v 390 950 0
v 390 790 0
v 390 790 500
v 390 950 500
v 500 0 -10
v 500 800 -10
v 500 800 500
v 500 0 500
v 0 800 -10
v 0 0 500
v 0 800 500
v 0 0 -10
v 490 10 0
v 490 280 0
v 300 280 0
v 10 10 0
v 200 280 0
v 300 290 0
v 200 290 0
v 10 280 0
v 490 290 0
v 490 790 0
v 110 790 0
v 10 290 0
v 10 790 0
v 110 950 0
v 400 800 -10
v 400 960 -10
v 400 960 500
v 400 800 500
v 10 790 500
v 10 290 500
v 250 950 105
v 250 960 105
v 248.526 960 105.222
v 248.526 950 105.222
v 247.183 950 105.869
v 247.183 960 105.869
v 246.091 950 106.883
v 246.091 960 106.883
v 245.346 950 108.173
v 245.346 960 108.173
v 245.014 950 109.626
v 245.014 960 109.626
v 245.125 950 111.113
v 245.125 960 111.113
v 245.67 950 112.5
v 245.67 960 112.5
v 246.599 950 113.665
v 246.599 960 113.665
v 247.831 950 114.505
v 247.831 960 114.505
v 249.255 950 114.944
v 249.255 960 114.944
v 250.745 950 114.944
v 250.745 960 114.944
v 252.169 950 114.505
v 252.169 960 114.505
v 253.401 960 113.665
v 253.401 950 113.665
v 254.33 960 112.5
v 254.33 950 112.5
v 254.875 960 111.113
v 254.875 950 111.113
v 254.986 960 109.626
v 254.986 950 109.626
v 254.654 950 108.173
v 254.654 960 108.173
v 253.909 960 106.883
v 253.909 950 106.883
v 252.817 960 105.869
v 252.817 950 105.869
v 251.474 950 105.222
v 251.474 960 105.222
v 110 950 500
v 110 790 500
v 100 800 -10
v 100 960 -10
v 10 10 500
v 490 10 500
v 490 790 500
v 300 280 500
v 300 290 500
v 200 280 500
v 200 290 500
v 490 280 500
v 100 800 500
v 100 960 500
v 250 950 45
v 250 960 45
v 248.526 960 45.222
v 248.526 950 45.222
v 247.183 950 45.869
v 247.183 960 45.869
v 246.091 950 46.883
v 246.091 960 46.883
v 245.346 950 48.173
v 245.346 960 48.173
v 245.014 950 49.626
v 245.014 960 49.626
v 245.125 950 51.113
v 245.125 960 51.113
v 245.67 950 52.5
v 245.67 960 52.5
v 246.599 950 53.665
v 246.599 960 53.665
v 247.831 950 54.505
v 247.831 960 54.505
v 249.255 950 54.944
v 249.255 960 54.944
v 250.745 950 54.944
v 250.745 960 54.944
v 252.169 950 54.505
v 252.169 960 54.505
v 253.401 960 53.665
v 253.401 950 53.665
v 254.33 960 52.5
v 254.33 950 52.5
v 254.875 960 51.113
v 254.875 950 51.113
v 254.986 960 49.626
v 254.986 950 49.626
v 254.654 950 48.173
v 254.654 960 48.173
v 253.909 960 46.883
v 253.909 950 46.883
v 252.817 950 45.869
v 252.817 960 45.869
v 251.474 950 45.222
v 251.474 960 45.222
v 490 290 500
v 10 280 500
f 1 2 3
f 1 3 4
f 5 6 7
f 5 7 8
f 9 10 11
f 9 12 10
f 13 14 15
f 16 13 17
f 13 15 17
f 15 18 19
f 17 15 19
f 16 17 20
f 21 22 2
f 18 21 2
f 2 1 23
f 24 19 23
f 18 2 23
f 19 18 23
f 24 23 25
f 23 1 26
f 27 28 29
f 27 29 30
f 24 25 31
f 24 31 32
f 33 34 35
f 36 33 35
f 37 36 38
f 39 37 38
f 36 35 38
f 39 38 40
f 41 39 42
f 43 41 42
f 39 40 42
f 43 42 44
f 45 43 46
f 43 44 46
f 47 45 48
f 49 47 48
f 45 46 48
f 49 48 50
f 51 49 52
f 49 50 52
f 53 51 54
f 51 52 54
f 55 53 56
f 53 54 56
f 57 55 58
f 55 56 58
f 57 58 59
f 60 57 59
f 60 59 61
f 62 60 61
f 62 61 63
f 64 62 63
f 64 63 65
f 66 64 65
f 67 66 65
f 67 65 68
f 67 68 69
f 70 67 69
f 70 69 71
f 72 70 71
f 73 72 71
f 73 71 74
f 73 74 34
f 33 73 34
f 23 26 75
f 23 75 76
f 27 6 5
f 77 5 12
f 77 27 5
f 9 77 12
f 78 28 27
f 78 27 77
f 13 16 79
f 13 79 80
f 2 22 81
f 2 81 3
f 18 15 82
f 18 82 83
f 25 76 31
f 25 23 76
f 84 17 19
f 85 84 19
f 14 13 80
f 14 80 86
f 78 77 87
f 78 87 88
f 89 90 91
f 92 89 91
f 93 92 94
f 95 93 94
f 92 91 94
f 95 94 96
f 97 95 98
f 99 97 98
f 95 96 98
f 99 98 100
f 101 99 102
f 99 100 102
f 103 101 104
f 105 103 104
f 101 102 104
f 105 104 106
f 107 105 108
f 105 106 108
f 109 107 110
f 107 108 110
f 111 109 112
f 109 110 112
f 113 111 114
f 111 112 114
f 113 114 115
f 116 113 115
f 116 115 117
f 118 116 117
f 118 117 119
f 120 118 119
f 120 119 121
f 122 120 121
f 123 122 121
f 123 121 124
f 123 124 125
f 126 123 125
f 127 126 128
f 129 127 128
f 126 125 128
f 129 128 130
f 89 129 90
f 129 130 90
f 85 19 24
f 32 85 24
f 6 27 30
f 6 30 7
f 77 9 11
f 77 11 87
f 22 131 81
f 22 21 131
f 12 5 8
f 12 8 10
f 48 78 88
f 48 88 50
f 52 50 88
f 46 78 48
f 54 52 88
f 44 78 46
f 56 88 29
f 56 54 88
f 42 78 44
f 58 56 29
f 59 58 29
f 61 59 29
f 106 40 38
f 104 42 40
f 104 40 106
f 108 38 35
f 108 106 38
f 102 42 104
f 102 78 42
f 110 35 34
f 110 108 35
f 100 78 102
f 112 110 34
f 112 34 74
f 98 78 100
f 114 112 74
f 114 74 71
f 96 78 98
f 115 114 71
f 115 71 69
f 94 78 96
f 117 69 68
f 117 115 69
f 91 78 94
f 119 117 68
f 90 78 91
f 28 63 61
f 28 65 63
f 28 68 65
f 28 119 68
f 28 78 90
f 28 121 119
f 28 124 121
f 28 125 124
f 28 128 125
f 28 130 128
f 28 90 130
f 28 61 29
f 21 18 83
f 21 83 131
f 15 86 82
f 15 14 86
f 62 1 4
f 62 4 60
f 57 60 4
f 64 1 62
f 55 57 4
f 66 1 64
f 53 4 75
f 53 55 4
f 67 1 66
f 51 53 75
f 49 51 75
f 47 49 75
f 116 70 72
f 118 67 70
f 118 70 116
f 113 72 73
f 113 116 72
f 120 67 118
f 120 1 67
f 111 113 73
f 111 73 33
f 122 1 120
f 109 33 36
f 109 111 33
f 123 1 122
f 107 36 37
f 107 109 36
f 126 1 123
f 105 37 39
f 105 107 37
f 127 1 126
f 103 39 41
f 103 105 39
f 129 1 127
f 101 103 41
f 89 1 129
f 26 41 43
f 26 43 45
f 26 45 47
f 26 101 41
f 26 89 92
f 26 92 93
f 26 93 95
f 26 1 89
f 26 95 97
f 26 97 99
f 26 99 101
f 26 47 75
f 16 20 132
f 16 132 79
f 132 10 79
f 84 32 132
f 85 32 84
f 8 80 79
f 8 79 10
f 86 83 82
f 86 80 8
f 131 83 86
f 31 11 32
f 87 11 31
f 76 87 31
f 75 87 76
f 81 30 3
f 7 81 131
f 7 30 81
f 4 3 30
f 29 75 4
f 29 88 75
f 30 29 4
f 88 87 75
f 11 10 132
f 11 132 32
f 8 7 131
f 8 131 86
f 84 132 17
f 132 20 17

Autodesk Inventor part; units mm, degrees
ref_plane "YZ Plane" through (0, 0, 0) normal (1, 0, 0) x (0, 1, 0)
ref_plane "XZ Plane" through (0, 0, 0) normal (0, 1, 0) x (-1, 0, 0)
ref_plane "XY Plane" through (0, 0, 0) normal (0, 0, 1) x (1, 0, 0)
sketch "스케치1" plane through (0, 0, 0) normal (0, 0, 1) x (1, 0, 0)
  line L0 (0, 0) -> (0, 800)
  line L1 (0, 800) -> (100, 800)
  line L2 (100, 800) -> (100, 960)
  line L3 (100, 960) -> (400, 960)
  line L4 (400, 960) -> (400, 800)
  line L5 (400, 800) -> (500, 800)
  line L6 (500, 800) -> (500, 0)
  line L7 (500, 0) -> (0, 0)
  line L8 (390, 950) -> (110, 950)
  line L9 (110, 950) -> (110, 790)
  line L10 (110, 790) -> (10, 790)
  line L11 (10, 790) -> (10, 10)
  line L12 (10, 10) -> (490, 10)
  line L13 (490, 10) -> (490, 790)
  line L14 (490, 790) -> (390, 790)
  line L15 (390, 790) -> (390, 950)
  line L16 (10, 280) -> (200, 280)
  line L17 (200, 280) -> (200, 290)
  line L18 (200, 290) -> (10, 290)
  line L19 (10, 290) -> (10, 280)
  line L20 (490, 280) -> (300, 280)
  line L21 (300, 280) -> (300, 290)
  line L22 (300, 290) -> (490, 290)
  line L23 (490, 290) -> (490, 280)
  dimension "d0" = 800
  dimension "d1" = 100
  dimension "d2" = 160
  dimension "d3" = 300
  dimension "d4" = 160
  dimension "d5" = 100
  dimension "d6" = 800
  dimension "d7" = 10
  dimension "d8" = 190
  dimension "d9" = 10
  dimension "d10" = 190
  dimension "d11" = 10
  dimension "d12" = 500
extrude "돌출1" add sketch "스케치1" along normal blind 500 contours L0 L1 L2 L3 L4 L5 L6 L7 | L13 L20 L21 L22 | L18 L17 L16 L11
sketch "스케치2" plane through (0, 0, 0) normal (0, 0, -1) x (-1, 0, 0)
  line L0 (-390, 790) -> (-390, 950) projected
  line L1 (-390, 950) -> (-110, 950) projected
  line L2 (-110, 950) -> (-110, 790) projected
  line L3 (-110, 790) -> (-10, 790) projected
  line L4 (-10, 790) -> (-10, 290) projected
  line L5 (-200, 290) -> (-10, 290) projected
  line L6 (-200, 280) -> (-200, 290) projected
  line L7 (-10, 280) -> (-200, 280) projected
  line L8 (-10, 280) -> (-10, 10) projected
  line L9 (-10, 10) -> (-490, 10) projected
  line L10 (-490, 10) -> (-490, 280) projected
  line L11 (-300, 280) -> (-490, 280) projected
  line L12 (-300, 290) -> (-300, 280) projected
  line L13 (-490, 290) -> (-300, 290) projected
  line L14 (-490, 290) -> (-490, 790) projected
  line L15 (-490, 790) -> (-390, 790) projected
  line L16 (0, 0) -> (0, 800) projected
  line L17 (0, 800) -> (-100, 800) projected
  line L18 (-100, 800) -> (-100, 960) projected
  line L19 (-100, 960) -> (-400, 960) projected
  line L20 (-400, 960) -> (-400, 800) projected
  line L21 (-400, 800) -> (-500, 800) projected
  line L22 (-500, 800) -> (-500, 0) projected
  line L23 (-500, 0) -> (0, 0) projected
extrude "돌출2" add sketch "스케치2" along normal blind 10 contours L0 L1 L2 L3 L4 L5 L6 L7 L8 L9 L10 L11 L12 L13 L14 L15 | L23 L22 L21 L20 L19 L18 L17 L16
sketch "스케치4" plane through (110, 950, 500) normal (0, -1, 0) x (1, 0, 0)
  line L0 (-10, 0) -> (-10, -510) projected
  line L1 (290, 0) -> (290, -510) projected
  line L2 (-10, -510) -> (290, -510) projected
  point P0 (-110, -500)
  point P1 (140, -390)
  point P2 (140, -450)
  dimension "d18" = 150
  dimension "d28" = 60
  dimension "d29" = 120
hole "구멍1" at (250, 950, 110) at (250, 950, 50) direction (0, 1, 0) diameter 10 end through all
properties part number "Space"
